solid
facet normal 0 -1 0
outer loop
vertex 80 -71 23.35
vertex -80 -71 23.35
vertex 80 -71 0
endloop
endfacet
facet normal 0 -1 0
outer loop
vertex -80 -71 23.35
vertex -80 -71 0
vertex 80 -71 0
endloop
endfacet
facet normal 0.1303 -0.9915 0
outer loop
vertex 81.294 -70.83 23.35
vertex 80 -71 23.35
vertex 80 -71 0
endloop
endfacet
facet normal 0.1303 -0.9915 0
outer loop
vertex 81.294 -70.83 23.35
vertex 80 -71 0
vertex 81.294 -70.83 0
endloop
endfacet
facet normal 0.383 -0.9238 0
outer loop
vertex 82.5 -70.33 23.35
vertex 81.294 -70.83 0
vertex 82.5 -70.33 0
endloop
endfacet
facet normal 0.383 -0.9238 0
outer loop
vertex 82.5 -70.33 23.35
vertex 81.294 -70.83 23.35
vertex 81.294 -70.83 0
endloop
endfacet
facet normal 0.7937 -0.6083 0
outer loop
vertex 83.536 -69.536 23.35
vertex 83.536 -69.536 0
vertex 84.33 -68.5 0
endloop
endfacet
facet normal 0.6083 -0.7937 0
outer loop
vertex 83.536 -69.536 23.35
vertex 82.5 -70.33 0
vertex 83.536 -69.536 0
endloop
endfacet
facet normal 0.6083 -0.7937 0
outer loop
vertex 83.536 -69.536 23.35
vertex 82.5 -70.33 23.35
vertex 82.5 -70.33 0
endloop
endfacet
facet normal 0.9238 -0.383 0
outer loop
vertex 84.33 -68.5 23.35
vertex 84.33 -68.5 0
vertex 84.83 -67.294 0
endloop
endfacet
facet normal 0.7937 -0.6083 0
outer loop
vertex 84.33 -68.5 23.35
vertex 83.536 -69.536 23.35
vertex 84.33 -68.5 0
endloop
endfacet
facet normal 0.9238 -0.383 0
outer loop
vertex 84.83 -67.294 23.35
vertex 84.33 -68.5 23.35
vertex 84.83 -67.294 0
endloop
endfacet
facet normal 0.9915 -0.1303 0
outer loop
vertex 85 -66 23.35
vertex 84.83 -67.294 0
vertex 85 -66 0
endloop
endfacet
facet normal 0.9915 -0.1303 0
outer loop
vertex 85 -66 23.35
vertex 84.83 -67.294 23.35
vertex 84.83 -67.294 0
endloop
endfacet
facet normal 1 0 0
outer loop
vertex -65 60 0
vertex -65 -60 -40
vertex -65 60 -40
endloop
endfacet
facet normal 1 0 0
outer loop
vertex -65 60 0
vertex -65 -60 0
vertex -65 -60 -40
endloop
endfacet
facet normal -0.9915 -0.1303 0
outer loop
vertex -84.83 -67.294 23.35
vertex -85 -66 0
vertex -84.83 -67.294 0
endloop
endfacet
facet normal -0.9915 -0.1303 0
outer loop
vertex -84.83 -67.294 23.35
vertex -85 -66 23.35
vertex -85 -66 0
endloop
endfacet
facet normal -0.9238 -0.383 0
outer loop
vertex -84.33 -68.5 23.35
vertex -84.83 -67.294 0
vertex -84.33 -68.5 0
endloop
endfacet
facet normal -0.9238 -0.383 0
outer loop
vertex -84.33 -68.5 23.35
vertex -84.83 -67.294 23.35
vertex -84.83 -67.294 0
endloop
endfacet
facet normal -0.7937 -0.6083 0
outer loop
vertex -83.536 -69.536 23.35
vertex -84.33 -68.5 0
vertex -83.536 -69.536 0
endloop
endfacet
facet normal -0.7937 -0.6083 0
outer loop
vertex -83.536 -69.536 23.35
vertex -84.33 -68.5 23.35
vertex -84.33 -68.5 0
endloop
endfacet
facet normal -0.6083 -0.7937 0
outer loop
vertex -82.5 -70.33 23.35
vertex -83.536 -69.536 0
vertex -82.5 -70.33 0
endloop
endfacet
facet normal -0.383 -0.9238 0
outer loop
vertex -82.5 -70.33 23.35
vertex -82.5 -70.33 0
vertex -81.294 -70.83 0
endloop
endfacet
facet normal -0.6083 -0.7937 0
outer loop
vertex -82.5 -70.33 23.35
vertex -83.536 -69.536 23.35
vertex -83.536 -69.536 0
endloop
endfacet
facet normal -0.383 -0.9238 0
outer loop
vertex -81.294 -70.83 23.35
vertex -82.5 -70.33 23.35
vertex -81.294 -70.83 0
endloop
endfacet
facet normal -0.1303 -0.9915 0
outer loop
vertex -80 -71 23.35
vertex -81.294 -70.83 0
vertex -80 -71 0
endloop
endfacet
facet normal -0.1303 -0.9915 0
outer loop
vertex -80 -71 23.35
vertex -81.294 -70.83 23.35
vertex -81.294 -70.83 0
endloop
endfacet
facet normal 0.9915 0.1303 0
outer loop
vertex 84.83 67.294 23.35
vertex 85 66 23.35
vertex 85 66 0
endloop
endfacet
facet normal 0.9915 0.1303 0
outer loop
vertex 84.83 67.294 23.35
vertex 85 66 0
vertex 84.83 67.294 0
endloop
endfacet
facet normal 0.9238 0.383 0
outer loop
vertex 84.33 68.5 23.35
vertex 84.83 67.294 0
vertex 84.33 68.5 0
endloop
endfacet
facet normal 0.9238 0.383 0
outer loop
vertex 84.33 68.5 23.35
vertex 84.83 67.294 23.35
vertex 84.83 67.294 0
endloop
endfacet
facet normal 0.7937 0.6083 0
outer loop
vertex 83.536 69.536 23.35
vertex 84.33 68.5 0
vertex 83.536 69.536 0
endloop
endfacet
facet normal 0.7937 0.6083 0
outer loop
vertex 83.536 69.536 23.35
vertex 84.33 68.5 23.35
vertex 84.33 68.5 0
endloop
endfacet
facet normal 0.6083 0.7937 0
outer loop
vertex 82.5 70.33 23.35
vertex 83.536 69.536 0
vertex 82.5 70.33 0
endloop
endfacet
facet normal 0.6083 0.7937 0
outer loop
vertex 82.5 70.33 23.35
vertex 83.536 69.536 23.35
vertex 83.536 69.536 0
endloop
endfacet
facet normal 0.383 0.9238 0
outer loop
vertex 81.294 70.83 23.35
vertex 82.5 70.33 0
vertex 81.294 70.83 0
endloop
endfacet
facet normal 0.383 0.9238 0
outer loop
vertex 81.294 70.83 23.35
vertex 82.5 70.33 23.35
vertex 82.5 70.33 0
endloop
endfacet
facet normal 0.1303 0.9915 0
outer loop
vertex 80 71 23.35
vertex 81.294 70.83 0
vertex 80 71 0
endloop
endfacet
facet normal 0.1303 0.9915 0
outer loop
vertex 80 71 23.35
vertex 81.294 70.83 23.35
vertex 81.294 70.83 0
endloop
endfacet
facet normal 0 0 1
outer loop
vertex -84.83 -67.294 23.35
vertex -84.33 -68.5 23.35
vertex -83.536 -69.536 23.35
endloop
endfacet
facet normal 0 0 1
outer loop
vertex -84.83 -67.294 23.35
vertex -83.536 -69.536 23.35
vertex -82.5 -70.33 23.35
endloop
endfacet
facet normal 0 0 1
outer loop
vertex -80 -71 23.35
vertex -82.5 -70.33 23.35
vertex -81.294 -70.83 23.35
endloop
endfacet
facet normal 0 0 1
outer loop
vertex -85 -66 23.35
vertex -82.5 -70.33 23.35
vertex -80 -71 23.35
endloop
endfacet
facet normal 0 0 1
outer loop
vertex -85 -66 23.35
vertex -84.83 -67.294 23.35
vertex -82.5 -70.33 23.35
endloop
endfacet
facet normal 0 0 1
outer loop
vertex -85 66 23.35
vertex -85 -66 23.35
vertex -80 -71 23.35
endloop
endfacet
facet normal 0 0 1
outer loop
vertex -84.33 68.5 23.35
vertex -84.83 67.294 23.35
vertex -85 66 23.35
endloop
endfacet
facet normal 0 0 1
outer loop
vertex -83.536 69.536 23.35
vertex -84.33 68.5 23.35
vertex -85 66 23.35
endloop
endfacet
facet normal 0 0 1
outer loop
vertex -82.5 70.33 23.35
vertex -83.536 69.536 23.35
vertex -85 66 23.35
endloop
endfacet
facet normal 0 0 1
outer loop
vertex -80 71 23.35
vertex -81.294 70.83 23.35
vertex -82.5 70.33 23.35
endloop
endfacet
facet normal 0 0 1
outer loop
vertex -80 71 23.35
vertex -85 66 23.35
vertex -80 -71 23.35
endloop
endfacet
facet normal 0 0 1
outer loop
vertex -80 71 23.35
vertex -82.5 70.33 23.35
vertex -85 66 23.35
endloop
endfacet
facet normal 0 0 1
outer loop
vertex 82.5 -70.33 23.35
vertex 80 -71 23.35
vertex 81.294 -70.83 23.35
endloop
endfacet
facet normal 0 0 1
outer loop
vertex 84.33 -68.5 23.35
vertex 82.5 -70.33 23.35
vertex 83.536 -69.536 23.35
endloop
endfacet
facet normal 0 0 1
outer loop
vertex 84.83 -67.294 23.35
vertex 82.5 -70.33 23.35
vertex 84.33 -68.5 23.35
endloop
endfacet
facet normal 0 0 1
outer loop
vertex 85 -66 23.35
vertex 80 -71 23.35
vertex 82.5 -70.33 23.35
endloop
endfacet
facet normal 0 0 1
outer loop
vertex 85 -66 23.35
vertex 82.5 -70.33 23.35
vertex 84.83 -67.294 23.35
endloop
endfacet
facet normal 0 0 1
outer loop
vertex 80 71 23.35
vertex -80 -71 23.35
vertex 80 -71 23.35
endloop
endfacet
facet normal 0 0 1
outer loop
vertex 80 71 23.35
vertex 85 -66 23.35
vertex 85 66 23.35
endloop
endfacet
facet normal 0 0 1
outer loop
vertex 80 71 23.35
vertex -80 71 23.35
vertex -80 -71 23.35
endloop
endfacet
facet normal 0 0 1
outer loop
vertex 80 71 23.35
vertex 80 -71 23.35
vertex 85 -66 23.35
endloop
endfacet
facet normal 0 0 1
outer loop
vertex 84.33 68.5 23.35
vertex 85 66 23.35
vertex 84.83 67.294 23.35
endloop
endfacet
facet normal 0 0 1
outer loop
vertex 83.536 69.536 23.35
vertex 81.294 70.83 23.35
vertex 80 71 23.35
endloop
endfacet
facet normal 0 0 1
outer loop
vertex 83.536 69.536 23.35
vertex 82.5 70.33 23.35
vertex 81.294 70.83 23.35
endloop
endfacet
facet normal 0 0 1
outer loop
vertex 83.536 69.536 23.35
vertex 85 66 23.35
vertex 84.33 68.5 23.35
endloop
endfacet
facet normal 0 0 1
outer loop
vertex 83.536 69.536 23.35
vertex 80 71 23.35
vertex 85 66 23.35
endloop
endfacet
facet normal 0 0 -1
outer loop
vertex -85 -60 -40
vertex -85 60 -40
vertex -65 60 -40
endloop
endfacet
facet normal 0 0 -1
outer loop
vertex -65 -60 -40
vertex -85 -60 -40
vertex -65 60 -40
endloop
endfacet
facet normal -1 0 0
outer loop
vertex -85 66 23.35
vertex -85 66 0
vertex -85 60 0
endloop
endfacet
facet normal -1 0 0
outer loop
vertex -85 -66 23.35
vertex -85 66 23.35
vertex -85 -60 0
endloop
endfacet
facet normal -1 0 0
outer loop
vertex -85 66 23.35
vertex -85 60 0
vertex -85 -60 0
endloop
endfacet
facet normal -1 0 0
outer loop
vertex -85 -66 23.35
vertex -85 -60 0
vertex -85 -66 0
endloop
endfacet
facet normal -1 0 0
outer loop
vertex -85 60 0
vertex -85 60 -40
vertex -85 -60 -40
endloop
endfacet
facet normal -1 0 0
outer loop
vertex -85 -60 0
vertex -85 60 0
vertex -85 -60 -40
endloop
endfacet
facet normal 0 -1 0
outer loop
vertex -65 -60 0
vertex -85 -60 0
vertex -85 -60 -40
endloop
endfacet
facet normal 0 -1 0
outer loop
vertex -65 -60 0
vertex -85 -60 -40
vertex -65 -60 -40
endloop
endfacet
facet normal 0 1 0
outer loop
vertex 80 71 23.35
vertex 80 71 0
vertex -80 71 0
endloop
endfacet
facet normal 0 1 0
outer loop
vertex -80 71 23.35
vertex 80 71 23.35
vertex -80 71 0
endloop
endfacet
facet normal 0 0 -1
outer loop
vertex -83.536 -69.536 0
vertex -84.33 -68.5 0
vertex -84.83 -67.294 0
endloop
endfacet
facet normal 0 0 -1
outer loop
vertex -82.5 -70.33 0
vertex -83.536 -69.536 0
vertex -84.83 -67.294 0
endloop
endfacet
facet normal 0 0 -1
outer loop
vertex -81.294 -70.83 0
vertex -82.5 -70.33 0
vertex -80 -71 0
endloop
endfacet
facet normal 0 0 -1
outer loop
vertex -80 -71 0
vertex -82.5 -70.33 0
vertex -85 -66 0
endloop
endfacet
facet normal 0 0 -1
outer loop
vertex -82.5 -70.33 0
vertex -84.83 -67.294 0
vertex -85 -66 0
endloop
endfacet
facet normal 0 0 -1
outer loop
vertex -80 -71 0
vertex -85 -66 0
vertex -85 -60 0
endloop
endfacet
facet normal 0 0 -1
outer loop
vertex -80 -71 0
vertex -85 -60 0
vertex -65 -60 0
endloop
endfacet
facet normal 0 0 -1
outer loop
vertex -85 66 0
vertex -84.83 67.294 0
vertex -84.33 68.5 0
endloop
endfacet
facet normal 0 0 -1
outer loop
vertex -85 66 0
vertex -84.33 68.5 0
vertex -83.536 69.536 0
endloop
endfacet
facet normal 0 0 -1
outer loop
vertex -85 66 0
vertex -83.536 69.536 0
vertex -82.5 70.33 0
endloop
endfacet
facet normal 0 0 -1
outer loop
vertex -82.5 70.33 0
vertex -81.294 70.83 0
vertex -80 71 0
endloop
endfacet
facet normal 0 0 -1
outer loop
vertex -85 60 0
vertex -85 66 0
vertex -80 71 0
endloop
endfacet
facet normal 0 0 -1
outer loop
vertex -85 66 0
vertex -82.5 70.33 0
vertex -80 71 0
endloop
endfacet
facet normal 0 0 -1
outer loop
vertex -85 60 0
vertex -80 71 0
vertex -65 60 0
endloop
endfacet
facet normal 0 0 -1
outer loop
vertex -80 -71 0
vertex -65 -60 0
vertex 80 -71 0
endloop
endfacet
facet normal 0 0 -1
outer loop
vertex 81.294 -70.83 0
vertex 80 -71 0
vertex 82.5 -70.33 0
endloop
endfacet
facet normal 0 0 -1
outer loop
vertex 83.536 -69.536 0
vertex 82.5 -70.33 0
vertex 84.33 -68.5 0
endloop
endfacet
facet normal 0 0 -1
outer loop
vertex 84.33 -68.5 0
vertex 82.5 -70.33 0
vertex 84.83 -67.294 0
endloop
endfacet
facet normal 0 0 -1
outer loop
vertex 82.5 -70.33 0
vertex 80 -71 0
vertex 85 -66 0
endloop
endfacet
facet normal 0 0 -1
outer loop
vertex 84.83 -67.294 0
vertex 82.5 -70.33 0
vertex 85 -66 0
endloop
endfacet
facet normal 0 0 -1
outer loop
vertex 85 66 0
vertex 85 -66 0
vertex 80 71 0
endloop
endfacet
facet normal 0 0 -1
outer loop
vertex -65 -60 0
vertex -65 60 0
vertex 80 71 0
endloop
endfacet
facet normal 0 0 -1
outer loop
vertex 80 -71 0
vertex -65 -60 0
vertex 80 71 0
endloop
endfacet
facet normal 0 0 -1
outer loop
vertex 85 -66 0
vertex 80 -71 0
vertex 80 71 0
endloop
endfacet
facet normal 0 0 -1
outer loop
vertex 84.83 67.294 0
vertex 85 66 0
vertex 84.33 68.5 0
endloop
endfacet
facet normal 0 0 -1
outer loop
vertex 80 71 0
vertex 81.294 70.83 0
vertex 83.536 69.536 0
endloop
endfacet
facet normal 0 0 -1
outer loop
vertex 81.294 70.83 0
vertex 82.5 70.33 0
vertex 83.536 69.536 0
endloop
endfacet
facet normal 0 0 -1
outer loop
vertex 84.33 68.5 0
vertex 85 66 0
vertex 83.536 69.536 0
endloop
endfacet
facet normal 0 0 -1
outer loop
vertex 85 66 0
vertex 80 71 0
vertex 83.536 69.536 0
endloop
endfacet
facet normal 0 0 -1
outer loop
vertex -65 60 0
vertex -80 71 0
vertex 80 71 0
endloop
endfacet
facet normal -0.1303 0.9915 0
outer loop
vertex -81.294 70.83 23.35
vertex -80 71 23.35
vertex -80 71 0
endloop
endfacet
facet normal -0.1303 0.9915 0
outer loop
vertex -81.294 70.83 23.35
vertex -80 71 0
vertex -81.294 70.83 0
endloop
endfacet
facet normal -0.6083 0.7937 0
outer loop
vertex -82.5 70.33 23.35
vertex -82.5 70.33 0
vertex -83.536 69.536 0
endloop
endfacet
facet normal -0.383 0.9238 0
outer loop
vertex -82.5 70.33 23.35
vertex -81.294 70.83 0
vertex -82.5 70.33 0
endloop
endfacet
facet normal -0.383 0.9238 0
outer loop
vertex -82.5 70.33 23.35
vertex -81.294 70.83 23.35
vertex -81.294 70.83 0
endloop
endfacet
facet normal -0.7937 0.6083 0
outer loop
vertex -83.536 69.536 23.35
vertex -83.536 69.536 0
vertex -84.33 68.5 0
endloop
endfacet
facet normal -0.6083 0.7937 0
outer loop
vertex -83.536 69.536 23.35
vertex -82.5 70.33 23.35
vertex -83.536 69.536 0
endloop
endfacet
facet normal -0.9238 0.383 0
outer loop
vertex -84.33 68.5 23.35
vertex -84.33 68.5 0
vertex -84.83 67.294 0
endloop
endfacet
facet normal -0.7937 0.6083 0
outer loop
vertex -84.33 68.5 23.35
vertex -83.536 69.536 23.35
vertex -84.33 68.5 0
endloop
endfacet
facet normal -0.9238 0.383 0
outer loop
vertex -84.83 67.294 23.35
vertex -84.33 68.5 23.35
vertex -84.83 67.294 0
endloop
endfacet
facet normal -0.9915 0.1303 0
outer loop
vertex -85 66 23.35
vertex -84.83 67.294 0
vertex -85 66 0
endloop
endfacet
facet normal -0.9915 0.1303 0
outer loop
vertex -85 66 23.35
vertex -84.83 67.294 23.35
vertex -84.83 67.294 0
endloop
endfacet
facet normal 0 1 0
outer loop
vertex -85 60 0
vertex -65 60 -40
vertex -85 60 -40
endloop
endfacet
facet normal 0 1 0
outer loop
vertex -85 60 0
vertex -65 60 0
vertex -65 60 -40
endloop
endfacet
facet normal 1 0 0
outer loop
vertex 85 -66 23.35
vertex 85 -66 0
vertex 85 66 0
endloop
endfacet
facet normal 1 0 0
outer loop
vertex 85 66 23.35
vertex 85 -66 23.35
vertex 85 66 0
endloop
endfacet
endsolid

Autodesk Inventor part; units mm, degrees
ref_plane "YZ Plane" through (0, 0, 0) normal (1, 0, 0) x (0, 1, 0)
ref_plane "XZ Plane" through (0, 0, 0) normal (0, 1, 0) x (-1, 0, 0)
ref_plane "XY Plane" through (0, 0, 0) normal (0, 0, 1) x (1, 0, 0)
sketch "スケッチ1" plane through (0, 0, 0) normal (0, 0, 1) x (1, 0, 0)
  line L0 (-85, -71) -> (85, -71)
  line L1 (85, -71) -> (85, 71)
  line L2 (85, 71) -> (-85, 71)
  line L3 (-85, 71) -> (-85, -71)
  line L4 (-85, -71) -> (85, 71) construction
  line L5 (85, -71) -> (-85, 71) construction
  point P0 (0, 0)
  dimension "d0" = 170
  dimension "d1" = 142
extrude "押し出し1" add sketch "スケッチ1" along normal blind 23.35
fillet "フィレット1" radius 5 4 edges at (-85, 71, 11.675) (-85, -71, 11.675) (85, 71, 11.675) (85, -71, 11.675)
sketch "スケッチ2" plane through (0, 0, 0) normal (0, 0, 1) x (1, 0, 0)
  arc A0 (80, -71) -> (85, -66) centre (80, -66) ccw projected
  line L0 (85, -66) -> (85, 66) projected
  arc A1 (85, 66) -> (80, 71) centre (80, 66) ccw projected
  line L1 (80, 71) -> (-80, 71) projected
  arc A2 (-80, 71) -> (-85, 66) centre (-80, 66) ccw projected
  line L2 (-85, 66) -> (-85, -66) projected
  arc A3 (-85, -66) -> (-80, -71) centre (-80, -66) ccw projected
  line L3 (-80, -71) -> (80, -71) projected
  line L4 (-60, 51) -> (60, 51)
  line L5 (60, 51) -> (60, 71)
  line L6 (60, 71) -> (-60, 71)
  line L7 (-60, 71) -> (-60, 51)
  line L8 (-60, 51) -> (60, 71) construction
  line L9 (60, 51) -> (-60, 71) construction
  line L10 (80, 71) -> (-80, 71) projected
  line L11 (-20, 71) -> (-20, 51)
  line L12 (20, 51) -> (20, 71)
  line L13 (-65, 60) -> (-85, 60)
  line L14 (-85, 60) -> (-85, -60)
  line L15 (-85, -60) -> (-65, -60)
  line L16 (-65, -60) -> (-65, 60)
  line L17 (-65, 60) -> (-85, -60) construction
  line L18 (-85, 60) -> (-65, -60) construction
  point P0 (0, 0)
  point P1 (0, 61)
  point P2 (0, 61)
  point P3 (-75, 0)
  point P4 (-75, 0)
  dimension "d5" = 120
  dimension "d6" = 20
  dimension "d9" = 40
  dimension "d10" = 40
  dimension "d11" = 120
  dimension "d12" = 20
extrude "押し出し2" add sketch "スケッチ2" against normal blind 40 contours L2 L13 L16 L15
properties part number "base_link"
